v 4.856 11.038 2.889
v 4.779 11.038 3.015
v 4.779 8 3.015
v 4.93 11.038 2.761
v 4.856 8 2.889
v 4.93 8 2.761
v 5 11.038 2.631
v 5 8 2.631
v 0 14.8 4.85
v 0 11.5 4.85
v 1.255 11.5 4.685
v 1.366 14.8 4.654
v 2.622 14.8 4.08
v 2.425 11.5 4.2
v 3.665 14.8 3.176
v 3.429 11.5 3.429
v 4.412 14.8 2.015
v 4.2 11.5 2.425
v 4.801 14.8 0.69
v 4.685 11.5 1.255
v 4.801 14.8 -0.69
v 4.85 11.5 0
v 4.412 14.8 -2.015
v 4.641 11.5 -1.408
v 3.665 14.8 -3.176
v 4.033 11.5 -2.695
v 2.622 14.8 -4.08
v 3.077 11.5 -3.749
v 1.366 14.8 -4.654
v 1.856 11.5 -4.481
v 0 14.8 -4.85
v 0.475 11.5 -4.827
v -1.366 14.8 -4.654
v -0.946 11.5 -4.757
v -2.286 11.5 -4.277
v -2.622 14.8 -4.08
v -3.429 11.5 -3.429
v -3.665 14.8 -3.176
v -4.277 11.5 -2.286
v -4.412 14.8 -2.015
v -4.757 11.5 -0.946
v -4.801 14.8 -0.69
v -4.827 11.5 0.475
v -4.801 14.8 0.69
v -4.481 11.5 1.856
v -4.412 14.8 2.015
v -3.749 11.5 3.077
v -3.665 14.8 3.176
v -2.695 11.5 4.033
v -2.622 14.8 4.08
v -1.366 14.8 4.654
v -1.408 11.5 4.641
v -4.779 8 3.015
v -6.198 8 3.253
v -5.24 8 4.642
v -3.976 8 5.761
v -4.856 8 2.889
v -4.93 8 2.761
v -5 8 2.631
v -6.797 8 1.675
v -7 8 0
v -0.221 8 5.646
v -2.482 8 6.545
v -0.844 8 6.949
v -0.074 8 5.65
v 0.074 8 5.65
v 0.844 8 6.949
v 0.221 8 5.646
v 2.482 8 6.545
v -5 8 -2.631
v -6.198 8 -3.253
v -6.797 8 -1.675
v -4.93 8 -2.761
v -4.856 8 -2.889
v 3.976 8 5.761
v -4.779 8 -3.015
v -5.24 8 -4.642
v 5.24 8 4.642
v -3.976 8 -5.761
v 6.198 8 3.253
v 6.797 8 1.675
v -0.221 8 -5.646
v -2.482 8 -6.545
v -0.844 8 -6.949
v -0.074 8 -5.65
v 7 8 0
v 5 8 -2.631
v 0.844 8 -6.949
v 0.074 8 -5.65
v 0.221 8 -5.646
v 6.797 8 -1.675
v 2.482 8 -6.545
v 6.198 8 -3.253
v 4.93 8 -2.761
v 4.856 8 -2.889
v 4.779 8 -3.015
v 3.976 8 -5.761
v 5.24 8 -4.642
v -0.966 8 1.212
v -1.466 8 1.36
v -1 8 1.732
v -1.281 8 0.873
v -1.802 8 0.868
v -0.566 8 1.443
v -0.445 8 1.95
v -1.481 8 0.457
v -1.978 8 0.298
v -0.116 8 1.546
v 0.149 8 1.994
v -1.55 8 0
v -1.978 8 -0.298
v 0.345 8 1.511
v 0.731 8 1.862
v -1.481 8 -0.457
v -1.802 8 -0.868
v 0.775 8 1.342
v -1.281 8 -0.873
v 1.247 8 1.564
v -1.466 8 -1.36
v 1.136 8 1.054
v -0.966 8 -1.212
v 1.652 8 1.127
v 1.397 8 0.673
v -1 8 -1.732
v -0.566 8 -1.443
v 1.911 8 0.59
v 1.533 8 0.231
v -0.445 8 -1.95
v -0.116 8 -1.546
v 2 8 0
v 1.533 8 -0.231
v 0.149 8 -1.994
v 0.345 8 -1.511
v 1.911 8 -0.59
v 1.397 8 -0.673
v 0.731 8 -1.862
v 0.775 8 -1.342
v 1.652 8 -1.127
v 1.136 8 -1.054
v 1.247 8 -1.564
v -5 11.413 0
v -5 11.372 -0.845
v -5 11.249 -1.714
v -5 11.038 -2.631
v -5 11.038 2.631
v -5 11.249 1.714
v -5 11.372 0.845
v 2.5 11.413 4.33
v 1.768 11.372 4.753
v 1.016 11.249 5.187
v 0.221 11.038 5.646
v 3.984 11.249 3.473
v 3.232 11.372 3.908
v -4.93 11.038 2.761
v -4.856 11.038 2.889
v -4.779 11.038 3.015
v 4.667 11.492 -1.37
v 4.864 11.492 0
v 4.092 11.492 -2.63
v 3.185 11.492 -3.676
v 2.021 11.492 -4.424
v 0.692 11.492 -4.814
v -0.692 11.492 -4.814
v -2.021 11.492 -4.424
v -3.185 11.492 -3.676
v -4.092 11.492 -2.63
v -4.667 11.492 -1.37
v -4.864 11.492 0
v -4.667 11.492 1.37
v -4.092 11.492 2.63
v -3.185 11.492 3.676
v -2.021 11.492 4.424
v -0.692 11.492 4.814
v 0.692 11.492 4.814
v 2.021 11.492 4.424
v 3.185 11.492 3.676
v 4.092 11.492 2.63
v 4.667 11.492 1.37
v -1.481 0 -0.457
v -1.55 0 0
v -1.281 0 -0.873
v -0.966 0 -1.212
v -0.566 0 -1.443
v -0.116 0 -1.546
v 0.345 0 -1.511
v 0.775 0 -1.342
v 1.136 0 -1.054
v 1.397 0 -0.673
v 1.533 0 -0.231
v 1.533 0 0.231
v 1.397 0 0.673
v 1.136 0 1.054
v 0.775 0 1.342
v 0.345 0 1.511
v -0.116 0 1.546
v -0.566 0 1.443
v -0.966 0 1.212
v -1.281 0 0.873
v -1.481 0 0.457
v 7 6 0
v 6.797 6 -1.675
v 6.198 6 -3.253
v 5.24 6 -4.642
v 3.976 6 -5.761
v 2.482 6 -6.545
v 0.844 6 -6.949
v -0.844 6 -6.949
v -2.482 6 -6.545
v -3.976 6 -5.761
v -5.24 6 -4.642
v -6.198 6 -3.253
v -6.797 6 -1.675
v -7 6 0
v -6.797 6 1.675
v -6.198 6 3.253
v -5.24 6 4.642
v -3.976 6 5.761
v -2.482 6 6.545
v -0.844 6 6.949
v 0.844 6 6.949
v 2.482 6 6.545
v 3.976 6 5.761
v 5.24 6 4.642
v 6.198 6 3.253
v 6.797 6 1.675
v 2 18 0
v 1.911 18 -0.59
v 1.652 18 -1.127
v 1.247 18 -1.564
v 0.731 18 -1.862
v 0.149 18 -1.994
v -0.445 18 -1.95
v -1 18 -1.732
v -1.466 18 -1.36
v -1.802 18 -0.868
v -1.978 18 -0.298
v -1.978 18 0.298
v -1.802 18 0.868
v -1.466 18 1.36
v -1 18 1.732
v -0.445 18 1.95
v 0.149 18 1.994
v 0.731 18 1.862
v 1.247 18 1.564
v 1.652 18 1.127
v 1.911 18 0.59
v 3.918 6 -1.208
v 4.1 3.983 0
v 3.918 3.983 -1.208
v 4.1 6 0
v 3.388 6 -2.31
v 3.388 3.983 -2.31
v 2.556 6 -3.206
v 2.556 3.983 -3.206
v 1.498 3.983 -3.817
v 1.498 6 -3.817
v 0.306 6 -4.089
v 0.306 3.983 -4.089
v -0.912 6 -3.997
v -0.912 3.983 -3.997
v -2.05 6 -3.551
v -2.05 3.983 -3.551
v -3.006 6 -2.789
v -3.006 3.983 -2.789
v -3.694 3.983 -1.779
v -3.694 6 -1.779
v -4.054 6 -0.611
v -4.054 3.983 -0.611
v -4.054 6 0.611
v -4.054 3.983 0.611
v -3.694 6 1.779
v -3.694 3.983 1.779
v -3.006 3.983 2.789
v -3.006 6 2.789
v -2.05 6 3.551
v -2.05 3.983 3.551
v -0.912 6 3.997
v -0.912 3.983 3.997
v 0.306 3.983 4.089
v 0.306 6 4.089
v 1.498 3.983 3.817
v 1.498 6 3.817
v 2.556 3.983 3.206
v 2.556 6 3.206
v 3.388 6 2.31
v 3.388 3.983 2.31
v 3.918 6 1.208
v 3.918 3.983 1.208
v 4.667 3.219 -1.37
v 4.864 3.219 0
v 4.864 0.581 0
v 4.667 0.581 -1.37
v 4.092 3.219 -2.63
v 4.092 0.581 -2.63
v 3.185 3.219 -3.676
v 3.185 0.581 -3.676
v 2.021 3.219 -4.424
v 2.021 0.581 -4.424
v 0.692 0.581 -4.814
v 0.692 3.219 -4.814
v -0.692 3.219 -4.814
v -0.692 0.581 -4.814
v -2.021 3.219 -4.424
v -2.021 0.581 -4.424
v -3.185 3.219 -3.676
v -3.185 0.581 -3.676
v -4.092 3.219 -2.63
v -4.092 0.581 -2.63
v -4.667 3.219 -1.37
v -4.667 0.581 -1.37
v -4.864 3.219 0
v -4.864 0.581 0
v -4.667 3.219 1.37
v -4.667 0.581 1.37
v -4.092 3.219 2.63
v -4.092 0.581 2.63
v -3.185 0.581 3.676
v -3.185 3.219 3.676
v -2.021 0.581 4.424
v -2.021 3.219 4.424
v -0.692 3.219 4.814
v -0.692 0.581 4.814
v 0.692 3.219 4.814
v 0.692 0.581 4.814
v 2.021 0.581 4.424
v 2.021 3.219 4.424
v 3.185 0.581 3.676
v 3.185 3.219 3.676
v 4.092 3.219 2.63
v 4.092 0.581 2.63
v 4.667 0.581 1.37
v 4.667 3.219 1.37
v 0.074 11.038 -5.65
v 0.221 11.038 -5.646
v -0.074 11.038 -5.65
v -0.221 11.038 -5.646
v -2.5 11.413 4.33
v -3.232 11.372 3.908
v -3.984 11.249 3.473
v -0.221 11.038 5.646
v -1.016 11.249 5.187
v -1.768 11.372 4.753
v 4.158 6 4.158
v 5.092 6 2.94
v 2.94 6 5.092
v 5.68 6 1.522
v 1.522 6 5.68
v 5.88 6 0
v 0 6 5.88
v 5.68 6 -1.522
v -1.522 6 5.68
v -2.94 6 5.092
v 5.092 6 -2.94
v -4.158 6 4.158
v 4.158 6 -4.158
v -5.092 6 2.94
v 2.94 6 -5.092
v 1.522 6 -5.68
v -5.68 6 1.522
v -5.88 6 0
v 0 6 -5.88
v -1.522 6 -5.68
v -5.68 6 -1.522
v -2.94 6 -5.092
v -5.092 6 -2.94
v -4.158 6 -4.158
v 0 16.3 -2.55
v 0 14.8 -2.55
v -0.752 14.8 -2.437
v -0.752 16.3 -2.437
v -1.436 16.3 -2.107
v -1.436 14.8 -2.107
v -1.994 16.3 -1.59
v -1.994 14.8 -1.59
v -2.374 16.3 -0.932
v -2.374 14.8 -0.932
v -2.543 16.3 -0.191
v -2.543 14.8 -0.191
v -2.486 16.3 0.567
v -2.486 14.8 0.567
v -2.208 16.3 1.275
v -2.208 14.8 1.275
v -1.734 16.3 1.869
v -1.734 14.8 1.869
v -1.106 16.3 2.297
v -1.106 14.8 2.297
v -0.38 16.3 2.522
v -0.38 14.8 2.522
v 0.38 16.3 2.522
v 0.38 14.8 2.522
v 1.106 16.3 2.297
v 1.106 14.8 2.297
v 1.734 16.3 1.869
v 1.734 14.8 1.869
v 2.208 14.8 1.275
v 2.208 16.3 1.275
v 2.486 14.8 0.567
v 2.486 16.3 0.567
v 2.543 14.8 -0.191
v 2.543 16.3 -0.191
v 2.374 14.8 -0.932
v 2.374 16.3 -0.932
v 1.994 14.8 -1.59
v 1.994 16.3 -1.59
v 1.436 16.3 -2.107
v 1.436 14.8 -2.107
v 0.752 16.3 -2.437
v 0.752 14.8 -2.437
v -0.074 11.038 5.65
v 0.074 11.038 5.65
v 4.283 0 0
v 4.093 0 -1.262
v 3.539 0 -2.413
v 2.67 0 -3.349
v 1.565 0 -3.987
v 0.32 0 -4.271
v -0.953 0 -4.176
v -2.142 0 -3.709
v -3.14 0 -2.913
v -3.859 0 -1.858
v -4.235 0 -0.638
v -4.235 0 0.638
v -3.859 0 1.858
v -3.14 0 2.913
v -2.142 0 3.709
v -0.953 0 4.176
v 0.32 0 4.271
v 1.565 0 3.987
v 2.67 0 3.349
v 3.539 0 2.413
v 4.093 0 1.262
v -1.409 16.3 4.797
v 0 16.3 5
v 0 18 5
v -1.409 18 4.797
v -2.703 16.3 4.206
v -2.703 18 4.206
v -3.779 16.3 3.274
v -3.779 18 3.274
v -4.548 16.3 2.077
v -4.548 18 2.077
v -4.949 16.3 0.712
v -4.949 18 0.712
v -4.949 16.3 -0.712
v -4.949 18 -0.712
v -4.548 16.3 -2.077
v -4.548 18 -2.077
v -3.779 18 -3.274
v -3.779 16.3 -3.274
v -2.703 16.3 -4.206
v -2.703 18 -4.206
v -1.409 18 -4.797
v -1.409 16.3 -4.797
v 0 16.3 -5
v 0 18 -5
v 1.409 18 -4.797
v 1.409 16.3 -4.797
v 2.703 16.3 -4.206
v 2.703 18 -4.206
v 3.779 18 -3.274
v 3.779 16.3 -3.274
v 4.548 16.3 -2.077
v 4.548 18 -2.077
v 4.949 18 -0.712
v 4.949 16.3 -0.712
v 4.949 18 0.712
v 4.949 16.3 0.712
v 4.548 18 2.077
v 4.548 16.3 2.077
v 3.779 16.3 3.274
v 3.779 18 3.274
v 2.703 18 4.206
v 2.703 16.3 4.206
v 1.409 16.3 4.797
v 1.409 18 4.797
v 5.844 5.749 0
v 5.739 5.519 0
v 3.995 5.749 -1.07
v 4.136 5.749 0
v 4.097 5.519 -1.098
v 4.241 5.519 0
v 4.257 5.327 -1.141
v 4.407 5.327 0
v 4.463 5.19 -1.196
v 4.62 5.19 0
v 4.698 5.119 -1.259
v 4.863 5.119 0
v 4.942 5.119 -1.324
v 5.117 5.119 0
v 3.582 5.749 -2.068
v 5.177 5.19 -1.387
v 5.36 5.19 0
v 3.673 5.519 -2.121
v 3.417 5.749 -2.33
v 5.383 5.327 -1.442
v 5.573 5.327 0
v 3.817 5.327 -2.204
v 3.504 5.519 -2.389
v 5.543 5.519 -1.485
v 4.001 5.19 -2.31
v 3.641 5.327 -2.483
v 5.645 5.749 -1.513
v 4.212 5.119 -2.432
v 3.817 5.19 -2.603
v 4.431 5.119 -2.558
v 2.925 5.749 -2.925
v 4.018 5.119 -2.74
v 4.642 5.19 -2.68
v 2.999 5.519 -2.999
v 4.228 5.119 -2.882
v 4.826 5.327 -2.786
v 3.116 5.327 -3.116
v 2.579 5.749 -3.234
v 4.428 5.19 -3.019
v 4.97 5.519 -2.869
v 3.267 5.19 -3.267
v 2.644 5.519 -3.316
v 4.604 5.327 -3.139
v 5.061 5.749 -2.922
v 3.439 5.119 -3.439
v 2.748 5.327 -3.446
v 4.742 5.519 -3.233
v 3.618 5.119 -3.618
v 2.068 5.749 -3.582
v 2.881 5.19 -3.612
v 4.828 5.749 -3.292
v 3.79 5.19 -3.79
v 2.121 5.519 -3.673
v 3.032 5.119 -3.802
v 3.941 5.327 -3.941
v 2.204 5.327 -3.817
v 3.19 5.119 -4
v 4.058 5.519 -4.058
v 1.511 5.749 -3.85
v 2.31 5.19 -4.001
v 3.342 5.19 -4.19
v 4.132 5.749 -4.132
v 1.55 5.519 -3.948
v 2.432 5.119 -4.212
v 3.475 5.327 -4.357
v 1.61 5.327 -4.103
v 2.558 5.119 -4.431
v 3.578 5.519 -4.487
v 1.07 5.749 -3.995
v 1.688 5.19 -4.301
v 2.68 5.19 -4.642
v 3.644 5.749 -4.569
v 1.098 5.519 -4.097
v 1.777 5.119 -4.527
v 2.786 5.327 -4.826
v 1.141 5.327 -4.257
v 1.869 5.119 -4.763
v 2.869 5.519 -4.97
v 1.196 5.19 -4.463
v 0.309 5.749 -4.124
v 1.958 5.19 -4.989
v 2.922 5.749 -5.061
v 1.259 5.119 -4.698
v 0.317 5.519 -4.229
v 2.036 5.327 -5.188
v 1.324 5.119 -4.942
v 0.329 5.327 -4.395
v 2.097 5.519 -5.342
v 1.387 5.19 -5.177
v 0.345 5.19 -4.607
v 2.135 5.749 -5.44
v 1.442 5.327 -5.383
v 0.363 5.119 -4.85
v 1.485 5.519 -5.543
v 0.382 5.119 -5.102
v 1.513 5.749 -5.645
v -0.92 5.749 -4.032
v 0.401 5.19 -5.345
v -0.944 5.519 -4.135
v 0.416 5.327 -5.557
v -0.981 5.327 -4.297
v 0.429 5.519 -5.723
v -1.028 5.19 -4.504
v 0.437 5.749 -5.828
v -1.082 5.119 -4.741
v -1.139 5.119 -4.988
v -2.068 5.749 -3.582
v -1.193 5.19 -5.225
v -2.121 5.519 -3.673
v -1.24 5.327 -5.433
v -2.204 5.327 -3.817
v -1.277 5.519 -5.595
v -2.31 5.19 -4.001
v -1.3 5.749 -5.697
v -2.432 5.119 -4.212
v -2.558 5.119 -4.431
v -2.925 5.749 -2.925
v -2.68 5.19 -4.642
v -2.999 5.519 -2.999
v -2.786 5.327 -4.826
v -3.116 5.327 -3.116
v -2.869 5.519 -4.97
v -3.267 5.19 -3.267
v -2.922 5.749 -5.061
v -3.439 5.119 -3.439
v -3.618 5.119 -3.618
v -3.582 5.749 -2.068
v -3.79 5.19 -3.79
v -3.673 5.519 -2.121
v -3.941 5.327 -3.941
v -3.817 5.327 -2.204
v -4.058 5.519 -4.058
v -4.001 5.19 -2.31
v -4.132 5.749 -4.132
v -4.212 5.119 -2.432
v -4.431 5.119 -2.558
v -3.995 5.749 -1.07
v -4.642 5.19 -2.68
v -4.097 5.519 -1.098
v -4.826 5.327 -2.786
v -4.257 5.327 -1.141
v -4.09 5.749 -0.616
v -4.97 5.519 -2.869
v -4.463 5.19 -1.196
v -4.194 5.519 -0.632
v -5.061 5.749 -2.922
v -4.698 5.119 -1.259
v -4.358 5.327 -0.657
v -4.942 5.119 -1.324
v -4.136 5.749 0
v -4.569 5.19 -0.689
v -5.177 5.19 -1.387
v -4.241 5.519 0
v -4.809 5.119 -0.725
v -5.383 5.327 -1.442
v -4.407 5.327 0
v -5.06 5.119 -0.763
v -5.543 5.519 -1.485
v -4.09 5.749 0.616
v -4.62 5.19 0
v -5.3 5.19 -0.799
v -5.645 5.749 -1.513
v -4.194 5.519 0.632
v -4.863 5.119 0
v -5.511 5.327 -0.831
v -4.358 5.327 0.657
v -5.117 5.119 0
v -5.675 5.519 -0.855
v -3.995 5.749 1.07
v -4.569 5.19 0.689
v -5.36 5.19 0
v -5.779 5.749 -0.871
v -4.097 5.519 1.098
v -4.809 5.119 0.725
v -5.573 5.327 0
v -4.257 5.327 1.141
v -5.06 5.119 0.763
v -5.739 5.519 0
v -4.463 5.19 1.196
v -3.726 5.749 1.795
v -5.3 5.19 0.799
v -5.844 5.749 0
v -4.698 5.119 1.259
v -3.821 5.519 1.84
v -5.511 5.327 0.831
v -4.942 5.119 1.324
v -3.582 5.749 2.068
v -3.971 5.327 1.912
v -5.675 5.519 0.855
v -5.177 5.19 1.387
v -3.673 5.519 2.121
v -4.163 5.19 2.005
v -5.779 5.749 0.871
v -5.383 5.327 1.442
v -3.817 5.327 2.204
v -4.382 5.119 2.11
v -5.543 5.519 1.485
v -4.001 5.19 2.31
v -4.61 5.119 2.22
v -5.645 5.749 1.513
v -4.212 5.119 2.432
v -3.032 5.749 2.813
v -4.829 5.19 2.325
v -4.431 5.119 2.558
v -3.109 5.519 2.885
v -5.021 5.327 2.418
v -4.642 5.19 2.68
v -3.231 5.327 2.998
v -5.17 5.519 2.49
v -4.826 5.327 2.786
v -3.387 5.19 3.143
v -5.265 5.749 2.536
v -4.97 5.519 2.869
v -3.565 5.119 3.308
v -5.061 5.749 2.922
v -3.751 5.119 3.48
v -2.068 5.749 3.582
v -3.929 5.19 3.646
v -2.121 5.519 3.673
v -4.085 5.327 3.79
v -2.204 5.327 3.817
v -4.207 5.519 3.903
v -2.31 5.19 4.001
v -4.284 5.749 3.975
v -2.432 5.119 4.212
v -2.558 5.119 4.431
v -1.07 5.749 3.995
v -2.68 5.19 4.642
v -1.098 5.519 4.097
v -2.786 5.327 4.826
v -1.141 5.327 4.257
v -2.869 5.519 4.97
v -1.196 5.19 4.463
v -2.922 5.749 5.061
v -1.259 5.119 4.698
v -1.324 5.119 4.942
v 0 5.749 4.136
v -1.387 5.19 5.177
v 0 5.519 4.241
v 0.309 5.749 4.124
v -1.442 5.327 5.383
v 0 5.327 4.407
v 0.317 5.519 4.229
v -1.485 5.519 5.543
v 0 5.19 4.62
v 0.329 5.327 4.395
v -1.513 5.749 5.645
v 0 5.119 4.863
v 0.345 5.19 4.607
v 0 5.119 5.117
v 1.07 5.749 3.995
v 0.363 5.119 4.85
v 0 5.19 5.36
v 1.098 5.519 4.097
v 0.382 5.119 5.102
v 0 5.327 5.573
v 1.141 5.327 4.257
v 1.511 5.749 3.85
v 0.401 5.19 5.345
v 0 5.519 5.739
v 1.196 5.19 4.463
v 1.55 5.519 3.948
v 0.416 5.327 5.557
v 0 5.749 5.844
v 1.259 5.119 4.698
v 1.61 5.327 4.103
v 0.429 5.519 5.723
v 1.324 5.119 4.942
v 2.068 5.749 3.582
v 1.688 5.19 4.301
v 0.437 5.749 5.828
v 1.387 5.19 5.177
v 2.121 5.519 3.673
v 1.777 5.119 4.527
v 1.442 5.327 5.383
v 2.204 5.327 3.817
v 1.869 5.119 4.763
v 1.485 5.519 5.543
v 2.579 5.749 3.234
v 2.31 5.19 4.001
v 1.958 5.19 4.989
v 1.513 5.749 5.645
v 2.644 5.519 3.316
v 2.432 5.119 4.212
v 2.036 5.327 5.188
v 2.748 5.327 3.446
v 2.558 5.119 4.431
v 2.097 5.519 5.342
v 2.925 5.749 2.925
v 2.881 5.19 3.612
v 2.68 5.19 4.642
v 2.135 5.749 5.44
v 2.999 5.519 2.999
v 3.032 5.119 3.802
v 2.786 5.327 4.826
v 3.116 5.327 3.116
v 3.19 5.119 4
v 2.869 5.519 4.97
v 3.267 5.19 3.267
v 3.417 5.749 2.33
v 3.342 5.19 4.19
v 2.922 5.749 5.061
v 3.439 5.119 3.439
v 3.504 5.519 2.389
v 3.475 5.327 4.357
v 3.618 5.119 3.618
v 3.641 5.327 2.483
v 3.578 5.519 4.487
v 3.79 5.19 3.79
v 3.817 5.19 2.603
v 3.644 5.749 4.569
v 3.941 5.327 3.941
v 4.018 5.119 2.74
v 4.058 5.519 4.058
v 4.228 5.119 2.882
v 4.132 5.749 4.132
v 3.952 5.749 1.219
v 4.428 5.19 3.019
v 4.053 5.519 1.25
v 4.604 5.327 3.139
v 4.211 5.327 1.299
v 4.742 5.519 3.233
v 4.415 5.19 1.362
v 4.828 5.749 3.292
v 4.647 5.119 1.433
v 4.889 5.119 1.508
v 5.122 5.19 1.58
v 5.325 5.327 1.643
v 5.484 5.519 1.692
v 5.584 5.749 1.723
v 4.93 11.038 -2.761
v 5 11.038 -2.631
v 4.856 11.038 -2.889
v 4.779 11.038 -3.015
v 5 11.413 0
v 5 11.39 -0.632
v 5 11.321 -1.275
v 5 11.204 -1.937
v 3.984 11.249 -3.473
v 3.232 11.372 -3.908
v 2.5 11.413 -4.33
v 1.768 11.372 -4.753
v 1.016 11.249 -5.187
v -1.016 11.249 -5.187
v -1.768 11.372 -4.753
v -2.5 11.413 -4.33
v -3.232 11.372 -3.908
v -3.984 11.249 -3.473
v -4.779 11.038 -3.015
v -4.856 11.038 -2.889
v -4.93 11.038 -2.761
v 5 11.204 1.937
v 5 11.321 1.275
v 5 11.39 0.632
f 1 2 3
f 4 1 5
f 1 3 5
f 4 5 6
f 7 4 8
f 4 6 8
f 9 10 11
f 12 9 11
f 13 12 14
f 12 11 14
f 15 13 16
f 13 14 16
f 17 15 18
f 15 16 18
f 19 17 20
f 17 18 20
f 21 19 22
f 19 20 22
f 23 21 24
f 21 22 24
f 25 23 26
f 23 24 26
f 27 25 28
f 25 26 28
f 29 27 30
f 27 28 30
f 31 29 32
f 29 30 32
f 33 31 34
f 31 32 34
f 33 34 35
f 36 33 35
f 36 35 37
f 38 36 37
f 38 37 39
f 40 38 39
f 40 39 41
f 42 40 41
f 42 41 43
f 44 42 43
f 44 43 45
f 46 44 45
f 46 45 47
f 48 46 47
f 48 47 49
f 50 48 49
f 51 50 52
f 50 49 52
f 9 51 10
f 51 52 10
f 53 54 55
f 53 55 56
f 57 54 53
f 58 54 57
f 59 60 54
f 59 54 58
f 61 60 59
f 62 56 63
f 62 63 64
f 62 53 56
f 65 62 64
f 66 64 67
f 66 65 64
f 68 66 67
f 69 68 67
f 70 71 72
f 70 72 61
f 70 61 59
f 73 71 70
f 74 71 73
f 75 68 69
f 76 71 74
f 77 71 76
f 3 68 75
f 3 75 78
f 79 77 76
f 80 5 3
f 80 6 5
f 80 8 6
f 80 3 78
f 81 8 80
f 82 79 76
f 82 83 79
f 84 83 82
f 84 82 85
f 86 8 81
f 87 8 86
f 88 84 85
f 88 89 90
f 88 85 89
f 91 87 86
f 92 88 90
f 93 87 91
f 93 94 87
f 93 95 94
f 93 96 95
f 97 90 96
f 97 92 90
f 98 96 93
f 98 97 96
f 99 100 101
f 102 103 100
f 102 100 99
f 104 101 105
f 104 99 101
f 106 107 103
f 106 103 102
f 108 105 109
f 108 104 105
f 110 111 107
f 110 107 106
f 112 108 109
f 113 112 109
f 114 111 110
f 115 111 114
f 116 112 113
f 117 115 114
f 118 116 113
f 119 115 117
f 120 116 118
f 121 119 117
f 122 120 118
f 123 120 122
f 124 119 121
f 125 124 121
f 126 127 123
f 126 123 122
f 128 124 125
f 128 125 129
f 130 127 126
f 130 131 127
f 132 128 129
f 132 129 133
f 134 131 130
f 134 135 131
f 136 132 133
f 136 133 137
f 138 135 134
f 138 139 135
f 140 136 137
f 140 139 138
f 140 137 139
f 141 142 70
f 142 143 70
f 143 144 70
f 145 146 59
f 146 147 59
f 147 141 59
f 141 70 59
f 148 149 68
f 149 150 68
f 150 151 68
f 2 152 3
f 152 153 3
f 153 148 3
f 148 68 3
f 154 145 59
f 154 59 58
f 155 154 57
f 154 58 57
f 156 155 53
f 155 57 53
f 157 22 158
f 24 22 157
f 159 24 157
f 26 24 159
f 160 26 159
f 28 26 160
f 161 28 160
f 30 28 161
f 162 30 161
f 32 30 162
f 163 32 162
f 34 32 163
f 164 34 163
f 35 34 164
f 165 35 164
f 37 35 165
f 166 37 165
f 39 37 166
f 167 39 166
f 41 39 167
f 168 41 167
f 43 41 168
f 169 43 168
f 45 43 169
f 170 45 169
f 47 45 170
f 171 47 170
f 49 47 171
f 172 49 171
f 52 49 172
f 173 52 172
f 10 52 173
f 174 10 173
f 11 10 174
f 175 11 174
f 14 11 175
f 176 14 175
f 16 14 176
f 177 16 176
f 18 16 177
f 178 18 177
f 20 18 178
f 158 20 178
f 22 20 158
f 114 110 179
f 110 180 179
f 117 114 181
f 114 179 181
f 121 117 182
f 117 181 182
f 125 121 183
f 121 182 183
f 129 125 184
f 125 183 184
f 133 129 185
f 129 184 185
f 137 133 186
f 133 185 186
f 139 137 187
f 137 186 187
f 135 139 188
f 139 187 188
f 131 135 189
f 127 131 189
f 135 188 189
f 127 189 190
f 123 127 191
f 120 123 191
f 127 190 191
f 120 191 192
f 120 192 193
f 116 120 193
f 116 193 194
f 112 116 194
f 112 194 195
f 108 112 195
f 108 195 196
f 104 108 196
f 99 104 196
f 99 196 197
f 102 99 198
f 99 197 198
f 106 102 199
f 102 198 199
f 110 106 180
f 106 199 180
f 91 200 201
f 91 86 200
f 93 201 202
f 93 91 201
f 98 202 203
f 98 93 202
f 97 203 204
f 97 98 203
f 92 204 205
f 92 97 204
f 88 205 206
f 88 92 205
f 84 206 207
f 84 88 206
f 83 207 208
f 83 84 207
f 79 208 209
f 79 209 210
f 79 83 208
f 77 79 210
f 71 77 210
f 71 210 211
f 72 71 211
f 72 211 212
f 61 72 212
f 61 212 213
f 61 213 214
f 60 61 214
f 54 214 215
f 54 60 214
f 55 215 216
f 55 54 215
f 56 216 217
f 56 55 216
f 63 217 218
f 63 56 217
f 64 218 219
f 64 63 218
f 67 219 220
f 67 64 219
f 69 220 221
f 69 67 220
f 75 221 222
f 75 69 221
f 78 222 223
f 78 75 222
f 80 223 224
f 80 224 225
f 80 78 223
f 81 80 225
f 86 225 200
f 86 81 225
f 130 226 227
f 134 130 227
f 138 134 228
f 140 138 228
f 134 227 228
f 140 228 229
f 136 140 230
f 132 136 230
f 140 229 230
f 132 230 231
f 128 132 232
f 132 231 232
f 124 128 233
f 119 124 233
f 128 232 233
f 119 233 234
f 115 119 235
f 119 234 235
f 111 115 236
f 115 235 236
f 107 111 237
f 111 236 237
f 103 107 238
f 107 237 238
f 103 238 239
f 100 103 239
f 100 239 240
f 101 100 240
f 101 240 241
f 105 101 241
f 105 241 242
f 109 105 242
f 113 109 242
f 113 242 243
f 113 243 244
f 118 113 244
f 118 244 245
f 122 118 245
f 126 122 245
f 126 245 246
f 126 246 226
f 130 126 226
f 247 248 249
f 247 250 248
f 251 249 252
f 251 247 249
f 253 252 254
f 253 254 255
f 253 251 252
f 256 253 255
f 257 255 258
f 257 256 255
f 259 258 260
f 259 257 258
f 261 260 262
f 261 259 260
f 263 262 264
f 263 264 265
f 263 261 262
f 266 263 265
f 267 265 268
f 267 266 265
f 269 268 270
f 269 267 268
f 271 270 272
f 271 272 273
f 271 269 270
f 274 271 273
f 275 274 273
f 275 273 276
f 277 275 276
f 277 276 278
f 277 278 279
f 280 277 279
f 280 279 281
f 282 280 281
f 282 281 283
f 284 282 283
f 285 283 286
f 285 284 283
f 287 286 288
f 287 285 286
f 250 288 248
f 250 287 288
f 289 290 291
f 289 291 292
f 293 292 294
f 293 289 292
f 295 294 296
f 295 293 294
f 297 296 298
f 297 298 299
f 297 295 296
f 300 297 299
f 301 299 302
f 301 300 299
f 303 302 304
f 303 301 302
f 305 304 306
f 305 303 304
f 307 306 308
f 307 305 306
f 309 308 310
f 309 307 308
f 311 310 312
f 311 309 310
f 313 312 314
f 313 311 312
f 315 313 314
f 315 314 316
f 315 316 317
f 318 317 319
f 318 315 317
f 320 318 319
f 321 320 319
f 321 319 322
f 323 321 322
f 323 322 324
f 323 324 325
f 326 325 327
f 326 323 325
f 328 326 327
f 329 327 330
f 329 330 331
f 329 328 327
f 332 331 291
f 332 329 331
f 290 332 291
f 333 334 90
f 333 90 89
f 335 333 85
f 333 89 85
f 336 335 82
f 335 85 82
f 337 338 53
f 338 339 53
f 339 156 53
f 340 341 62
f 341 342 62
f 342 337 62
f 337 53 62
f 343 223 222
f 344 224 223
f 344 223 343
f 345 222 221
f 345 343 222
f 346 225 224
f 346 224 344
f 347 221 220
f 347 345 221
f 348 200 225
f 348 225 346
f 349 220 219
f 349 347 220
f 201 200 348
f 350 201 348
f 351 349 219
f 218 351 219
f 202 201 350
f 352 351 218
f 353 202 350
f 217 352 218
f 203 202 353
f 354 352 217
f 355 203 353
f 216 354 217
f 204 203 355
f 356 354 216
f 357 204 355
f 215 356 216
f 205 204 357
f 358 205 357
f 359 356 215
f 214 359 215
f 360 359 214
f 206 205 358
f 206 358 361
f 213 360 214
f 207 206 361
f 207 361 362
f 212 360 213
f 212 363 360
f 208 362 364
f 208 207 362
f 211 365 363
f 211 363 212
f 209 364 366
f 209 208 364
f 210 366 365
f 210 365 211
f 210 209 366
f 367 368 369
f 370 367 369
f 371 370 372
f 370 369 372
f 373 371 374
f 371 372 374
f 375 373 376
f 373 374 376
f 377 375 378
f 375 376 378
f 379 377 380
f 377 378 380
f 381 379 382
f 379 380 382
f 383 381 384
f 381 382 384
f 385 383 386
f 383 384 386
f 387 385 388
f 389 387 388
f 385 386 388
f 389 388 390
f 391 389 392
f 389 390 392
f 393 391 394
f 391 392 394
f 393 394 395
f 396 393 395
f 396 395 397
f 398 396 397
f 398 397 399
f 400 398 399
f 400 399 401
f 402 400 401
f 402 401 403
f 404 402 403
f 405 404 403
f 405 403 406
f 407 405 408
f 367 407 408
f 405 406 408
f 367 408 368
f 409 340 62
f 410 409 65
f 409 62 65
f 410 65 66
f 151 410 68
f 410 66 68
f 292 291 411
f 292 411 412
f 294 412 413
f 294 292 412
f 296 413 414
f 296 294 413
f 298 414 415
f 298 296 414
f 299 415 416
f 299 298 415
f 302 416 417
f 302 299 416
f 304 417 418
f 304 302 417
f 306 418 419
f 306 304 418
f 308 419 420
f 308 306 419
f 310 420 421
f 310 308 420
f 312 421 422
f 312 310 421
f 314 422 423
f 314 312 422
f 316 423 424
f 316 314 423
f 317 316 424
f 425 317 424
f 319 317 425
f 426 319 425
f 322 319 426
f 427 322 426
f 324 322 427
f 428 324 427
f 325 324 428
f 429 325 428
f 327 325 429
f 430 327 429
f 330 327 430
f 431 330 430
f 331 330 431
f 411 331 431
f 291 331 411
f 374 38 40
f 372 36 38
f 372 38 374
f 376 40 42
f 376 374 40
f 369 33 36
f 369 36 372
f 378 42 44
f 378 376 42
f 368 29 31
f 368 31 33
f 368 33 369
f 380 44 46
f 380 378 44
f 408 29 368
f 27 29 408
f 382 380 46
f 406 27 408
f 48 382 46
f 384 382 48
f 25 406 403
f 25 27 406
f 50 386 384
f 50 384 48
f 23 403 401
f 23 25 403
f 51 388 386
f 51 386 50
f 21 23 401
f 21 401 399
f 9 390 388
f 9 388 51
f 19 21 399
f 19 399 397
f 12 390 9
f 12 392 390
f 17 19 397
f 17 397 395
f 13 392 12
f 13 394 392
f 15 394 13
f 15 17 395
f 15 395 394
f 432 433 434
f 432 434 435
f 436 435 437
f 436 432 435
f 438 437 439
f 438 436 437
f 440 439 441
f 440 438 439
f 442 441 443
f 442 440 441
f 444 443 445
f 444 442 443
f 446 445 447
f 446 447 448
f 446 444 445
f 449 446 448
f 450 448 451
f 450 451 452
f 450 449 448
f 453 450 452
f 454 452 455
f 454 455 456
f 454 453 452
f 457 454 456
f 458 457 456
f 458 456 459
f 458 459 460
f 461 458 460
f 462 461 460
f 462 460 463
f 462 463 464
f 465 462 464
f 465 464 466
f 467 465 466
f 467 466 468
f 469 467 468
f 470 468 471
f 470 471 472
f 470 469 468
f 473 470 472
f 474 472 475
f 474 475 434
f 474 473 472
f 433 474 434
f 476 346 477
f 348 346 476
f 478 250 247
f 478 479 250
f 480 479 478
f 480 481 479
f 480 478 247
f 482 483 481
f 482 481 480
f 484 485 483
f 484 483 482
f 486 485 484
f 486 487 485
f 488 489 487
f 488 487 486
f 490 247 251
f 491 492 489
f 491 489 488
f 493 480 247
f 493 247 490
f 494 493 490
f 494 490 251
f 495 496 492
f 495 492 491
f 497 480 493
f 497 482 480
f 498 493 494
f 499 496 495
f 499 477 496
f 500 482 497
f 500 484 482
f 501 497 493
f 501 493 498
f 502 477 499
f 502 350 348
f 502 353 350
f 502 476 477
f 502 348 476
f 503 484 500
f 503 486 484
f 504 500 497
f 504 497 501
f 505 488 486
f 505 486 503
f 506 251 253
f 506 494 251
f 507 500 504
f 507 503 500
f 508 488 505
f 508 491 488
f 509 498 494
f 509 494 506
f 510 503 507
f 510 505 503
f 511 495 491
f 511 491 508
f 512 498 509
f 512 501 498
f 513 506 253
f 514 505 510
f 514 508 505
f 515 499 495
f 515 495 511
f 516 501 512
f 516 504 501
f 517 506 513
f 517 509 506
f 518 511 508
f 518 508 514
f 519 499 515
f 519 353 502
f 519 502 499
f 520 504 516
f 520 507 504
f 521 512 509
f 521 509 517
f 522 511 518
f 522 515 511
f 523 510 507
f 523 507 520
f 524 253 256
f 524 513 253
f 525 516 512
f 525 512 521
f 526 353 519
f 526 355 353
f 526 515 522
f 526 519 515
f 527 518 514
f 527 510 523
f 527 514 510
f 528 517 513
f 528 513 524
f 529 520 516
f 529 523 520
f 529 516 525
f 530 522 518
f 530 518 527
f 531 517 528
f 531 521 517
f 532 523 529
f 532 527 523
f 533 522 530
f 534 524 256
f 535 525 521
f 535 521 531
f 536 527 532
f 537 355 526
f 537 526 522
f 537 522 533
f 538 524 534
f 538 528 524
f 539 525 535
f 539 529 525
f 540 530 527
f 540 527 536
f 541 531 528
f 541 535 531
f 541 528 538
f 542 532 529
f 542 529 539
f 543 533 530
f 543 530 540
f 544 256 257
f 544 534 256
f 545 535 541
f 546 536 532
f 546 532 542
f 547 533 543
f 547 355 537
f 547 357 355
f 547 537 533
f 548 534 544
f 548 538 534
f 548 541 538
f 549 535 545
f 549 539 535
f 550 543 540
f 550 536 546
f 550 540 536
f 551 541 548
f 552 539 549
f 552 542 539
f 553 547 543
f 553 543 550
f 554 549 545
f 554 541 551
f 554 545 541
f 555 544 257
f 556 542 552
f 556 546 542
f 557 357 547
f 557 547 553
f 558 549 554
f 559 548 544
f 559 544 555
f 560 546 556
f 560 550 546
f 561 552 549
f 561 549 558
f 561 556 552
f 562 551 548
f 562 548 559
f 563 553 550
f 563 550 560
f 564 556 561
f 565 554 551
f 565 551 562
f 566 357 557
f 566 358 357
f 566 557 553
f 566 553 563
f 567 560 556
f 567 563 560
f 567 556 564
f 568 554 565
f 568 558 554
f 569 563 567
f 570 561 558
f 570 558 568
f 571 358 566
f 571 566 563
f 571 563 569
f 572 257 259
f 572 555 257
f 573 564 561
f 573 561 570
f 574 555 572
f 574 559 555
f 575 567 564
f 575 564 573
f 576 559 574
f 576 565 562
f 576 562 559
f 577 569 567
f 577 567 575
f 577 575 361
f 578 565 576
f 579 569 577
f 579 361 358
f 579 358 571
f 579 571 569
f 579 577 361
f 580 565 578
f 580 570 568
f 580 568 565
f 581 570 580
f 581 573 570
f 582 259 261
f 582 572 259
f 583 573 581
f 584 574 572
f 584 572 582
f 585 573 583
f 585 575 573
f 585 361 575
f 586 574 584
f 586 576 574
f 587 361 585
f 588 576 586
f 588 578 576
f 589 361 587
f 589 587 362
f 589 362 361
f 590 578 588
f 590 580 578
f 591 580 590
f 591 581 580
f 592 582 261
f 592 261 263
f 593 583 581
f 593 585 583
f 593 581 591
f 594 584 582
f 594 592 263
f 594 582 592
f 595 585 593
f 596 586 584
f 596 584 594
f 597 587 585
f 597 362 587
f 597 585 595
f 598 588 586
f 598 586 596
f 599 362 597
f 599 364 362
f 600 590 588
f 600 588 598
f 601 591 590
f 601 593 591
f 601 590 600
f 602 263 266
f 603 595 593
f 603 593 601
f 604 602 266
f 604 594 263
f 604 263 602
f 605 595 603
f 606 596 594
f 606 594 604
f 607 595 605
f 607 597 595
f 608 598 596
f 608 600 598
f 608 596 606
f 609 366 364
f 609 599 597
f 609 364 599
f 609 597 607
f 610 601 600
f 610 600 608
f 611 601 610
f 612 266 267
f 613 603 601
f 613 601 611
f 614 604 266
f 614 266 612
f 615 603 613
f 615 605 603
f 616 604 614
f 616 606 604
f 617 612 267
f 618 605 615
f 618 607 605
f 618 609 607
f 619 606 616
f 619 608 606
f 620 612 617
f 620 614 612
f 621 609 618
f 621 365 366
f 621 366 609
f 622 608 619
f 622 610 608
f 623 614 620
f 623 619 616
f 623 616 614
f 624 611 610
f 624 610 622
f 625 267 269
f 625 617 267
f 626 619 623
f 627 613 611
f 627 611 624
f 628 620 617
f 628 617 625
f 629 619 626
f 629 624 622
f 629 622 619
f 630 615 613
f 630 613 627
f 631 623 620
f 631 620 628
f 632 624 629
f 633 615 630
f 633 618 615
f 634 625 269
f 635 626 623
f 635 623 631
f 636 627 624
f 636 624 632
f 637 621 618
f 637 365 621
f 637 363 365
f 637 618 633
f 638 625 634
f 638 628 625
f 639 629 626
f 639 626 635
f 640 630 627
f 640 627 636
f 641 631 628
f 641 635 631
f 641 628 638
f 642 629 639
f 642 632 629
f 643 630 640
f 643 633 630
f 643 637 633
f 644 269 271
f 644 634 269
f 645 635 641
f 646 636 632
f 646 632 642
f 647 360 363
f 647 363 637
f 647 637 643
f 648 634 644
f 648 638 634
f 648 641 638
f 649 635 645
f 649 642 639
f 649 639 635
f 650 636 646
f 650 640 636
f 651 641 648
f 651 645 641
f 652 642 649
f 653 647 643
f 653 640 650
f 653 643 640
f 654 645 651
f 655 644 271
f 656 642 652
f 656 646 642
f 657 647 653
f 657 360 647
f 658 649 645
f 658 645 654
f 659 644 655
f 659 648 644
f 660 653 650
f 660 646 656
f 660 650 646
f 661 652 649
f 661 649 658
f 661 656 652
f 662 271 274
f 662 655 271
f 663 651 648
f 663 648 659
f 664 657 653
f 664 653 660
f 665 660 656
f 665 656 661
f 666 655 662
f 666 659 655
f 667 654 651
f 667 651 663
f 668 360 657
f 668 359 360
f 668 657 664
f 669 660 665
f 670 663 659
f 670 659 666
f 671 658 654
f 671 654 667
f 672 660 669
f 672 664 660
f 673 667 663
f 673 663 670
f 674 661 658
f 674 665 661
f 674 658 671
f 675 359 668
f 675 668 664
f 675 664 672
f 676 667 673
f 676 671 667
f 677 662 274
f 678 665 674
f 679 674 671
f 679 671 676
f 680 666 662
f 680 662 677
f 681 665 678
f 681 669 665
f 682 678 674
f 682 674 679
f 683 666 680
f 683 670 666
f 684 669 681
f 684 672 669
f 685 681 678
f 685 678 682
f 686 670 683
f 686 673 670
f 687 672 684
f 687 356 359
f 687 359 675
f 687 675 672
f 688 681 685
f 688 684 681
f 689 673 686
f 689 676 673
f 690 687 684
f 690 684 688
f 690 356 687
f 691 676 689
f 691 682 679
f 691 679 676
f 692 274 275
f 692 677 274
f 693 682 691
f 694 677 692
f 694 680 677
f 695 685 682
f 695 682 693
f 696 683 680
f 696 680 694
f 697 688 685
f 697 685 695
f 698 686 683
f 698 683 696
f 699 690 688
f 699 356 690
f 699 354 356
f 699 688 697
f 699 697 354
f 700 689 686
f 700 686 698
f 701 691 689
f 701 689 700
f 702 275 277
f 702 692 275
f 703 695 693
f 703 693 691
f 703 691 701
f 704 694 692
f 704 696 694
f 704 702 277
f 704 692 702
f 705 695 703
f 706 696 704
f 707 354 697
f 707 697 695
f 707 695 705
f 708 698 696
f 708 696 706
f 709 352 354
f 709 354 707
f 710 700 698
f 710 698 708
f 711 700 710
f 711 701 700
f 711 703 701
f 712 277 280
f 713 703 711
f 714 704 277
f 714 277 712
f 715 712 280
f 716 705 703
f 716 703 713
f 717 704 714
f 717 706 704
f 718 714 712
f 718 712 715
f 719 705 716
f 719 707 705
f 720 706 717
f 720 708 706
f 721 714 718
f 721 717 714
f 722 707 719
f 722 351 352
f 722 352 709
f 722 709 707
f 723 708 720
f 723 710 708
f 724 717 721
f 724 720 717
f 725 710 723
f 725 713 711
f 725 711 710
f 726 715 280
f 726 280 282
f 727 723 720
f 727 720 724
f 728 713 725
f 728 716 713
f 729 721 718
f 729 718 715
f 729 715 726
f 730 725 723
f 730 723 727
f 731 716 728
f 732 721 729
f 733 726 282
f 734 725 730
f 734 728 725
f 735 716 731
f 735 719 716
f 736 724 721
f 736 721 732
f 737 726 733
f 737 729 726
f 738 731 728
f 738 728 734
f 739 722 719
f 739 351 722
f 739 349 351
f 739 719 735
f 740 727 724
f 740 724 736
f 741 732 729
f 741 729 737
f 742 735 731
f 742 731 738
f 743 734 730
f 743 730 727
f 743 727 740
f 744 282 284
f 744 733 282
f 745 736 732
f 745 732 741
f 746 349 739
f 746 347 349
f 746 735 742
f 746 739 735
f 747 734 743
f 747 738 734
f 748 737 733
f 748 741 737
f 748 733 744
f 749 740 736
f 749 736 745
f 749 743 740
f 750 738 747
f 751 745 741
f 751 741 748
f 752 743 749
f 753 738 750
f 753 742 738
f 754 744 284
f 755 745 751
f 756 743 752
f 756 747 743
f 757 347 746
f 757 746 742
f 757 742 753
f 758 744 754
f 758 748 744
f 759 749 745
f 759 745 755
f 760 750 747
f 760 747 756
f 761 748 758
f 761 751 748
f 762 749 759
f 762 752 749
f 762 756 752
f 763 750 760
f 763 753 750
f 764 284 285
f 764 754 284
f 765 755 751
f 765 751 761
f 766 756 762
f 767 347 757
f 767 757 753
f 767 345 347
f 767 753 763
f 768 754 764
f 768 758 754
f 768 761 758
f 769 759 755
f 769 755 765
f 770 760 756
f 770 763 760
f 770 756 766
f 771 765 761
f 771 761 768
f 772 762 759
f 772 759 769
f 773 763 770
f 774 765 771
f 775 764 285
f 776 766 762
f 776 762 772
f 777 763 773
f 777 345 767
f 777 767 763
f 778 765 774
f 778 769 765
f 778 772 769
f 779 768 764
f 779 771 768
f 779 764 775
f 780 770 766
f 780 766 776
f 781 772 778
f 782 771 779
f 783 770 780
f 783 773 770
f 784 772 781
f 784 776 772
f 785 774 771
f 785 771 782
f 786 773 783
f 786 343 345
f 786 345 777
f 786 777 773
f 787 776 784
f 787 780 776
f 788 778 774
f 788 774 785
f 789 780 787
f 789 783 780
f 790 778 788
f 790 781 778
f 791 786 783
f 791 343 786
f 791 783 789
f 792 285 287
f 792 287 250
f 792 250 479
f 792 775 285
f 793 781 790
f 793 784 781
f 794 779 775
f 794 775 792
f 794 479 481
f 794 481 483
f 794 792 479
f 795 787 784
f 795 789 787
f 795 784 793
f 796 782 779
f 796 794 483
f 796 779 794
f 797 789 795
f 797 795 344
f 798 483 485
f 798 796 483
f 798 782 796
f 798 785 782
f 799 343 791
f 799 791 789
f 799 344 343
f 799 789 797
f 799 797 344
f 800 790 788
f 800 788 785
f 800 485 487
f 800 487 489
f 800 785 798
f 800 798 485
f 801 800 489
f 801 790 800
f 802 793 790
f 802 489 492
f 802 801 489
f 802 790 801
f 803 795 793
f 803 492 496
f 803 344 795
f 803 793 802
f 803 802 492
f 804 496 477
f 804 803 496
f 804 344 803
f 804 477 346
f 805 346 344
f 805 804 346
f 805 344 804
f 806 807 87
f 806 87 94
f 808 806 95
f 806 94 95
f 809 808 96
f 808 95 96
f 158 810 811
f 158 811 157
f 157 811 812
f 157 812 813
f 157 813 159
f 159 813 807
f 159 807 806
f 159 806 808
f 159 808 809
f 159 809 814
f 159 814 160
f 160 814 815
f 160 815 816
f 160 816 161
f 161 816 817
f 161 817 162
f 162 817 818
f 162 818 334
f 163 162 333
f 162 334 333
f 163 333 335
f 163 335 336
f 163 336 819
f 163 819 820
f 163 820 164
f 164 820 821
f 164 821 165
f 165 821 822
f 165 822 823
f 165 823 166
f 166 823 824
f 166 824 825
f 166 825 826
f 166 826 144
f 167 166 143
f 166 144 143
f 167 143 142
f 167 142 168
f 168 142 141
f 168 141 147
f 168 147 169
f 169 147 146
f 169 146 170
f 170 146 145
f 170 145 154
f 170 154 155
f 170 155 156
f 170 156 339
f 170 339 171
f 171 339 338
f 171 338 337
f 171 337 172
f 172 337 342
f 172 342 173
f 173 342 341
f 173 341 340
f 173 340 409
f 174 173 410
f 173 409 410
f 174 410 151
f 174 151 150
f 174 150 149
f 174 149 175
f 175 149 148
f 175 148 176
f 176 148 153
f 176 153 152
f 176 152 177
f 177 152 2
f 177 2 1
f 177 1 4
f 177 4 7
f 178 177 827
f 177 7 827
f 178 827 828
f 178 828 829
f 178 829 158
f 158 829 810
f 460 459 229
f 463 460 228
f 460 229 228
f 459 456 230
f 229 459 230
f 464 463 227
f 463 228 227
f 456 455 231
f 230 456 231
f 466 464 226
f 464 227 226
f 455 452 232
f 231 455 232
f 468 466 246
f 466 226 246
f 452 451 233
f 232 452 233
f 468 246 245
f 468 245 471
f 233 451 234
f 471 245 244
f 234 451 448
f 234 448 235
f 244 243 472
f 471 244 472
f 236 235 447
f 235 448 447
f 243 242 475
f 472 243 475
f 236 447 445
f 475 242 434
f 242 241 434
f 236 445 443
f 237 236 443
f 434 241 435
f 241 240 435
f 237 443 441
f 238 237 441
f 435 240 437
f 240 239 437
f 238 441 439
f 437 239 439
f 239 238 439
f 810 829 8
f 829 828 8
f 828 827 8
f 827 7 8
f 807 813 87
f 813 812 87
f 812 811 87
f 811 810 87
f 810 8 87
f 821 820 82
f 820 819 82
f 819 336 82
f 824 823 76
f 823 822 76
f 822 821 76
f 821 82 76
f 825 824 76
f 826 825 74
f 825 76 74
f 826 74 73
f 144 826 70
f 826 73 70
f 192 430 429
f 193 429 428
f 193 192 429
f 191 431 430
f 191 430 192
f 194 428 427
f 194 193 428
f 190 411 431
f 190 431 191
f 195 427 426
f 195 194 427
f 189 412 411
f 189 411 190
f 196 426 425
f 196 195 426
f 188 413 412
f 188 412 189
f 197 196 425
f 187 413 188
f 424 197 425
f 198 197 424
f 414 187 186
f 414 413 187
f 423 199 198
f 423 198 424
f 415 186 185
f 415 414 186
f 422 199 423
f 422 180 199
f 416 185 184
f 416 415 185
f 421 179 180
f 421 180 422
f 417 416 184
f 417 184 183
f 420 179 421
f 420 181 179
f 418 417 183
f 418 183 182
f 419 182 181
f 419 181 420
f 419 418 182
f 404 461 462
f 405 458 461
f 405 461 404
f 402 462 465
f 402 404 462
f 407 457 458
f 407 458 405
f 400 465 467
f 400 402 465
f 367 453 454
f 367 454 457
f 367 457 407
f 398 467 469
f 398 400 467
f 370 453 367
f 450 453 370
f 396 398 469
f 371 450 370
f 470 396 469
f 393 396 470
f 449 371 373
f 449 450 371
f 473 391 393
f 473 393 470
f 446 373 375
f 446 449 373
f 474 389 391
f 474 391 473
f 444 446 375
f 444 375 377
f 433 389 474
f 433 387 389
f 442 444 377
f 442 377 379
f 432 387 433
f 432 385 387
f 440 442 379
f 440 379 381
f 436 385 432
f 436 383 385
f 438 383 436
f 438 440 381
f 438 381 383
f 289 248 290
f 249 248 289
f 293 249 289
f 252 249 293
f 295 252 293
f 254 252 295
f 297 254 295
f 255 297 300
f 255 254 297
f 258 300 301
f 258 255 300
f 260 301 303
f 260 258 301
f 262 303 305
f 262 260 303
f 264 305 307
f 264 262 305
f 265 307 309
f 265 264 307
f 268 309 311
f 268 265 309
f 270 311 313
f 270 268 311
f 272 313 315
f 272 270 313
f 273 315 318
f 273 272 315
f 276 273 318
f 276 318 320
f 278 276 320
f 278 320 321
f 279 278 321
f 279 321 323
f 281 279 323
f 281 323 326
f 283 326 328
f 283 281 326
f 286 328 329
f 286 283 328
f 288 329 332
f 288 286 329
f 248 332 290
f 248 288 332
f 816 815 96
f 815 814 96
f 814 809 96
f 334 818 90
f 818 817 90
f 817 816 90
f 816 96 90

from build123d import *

# Parameters (mm, degrees)
ESTRUSIONE_ESTRUSIONE1_START                         = 8
ESTRUSIONE_ESTRUSIONE1_2_OUTLINE_R                   = 4.864
ESTRUSIONE_ESTRUSIONE1_2_DEPTH                       = 3.491917096
SCHIZZO2_R                                           = 4.85
ESTRUSIONE_ESTRUSIONE2_DEPTH                         = 3.3
SCHIZZO3_R                                           = 2.55
ESTRUSIONE_ESTRUSIONE3_DEPTH                         = 1.5
SCHIZZO4_R                                           = 5
ESTRUSIONE_ESTRUSIONE4_DEPTH                         = 1.7
FORO_LAMATO_PER_VITE_M2_5_A_TESTA_ESAGON_D           = 3.1
FORO_LAMATO_PER_VITE_M2_5_A_TESTA_ESAGON_CBORE_D     = 4
FORO_LAMATO_PER_VITE_M2_5_A_TESTA_ESAGON_CBORE_DEPTH = 10
SMUSSO1_SIZE                                         = 0.581


with BuildPart() as part:
    # Estrusione-Estrusione1: read off the stored shape, not the designer's step
    # Estrusione-Estrusione1 outline → Estrusione-Estrusione1 (revolve)
    with BuildSketch(Plane.XY):
        with BuildLine():
            Line((0, 0), (4.864, 0))
            Line((4.864, 0), (4.864, 3.219))
            Line((4.864, 3.219), (4.1, 3.983))
            Line((4.1, 3.983), (4.1, 6))
            ThreePointArc((4.1, 6), (4.99, 5.11), (5.88, 6))
            Line((5.88, 6), (7, 6))
            Line((7, 6), (7, 8))
            Line((7, 8), (4.864, 8))
            Line((4.864, 8), (4.864, 11.491917096))
            Line((4.864, 11.491917096), (4.85, 11.5))
            Line((4.85, 11.5), (0, 11.5))
            Line((0, 11.5), (0, 0))
        make_face()
    revolve(axis=Axis((0, 0, 0), (0, 1, 0)))

    # Estrusione-Estrusione1 2 outline → Estrusione-Estrusione1 2 (add)
    with BuildSketch(Plane(origin=(0, 0, 0), x_dir=(1, 0, 0), z_dir=(0, 1, 0)).offset(ESTRUSIONE_ESTRUSIONE1_START)):
        with BuildLine():
            ThreePointArc((4.77856863, -3.014594807), (4.893043531, -2.825), (5, -2.631064423))
            Line((5, -2.631064423), (5, 2.631064423))
            ThreePointArc((5, 2.631064423), (4.893043531, 2.825), (4.77856863, 3.014594807))
            Line((4.77856863, 3.014594807), (0.22143137, 5.645659231))
            ThreePointArc((0.22143137, 5.645659231), (0, 5.65), (-0.22143137, 5.645659231))
            Line((-0.22143137, 5.645659231), (-4.77856863, 3.014594807))
            ThreePointArc((-4.77856863, 3.014594807), (-4.893043531, 2.825), (-5, 2.631064423))
            Line((-5, 2.631064423), (-5, -2.631064423))
            ThreePointArc((-5, -2.631064423), (-4.893043531, -2.825), (-4.77856863, -3.014594807))
            Line((-4.77856863, -3.014594807), (-0.22143137, -5.645659231))
            ThreePointArc((-0.22143137, -5.645659231), (0, -5.65), (0.22143137, -5.645659231))
            Line((0.22143137, -5.645659231), (4.77856863, -3.014594807))
        make_face()
        Circle(ESTRUSIONE_ESTRUSIONE1_2_OUTLINE_R, mode=Mode.SUBTRACT)
    extrude(amount=ESTRUSIONE_ESTRUSIONE1_2_DEPTH)

    # Estrusione-Estrusione1 3 outline → Estrusione-Estrusione1 3 (revolve, cut)
    with BuildSketch(Plane.XY):
        Polygon((5.65, 11.491917096), (4.864, 11.491917096), (5.65, 11.038119785), align=None)
    revolve(axis=Axis((0, 0, 0), (0, 1, 0)), mode=Mode.SUBTRACT)

    # Schizzo2 → Estrusione-Estrusione2 (add)
    with BuildSketch(Plane(origin=(0, 11.5, 0), x_dir=(-1, 0, 0), z_dir=(0, 1, 0))):
        with Locations(Location((0, 0, 0), (0, 0, 90))):
            Circle(SCHIZZO2_R)
    extrude(amount=ESTRUSIONE_ESTRUSIONE2_DEPTH)

    # Schizzo3 → Estrusione-Estrusione3 (add)
    with BuildSketch(Plane(origin=(0, 14.8, 0), x_dir=(-1, 0, 0), z_dir=(0, 1, 0))):
        with Locations(Location((0, 0, 0), (0, 0, 270))):
            Circle(SCHIZZO3_R)
    extrude(amount=ESTRUSIONE_ESTRUSIONE3_DEPTH)

    # Schizzo4 → Estrusione-Estrusione4 (add)
    with BuildSketch(Plane.XZ.offset(-16.3)):
        with Locations(Location((0, 0, 0), (0, 0, 90))):
            Circle(SCHIZZO4_R)
    extrude(amount=-ESTRUSIONE_ESTRUSIONE4_DEPTH)

    # Foro lamato per Vite M2.5 a testa esagonale-1 (through all)
    with Locations(Plane(origin=(0, 18, 0), x_dir=(1, 0, 0), z_dir=(0, 1, 0))):
        with Locations((0, 0)):
            CounterBoreHole(FORO_LAMATO_PER_VITE_M2_5_A_TESTA_ESAGON_D / 2, FORO_LAMATO_PER_VITE_M2_5_A_TESTA_ESAGON_CBORE_D / 2, FORO_LAMATO_PER_VITE_M2_5_A_TESTA_ESAGON_CBORE_DEPTH)

    # Smusso1
    smusso1_edges = [part.edges().sort_by_distance(p)[0] for p in [
        (-4.864, 0, 0),
    ]]
    chamfer(smusso1_edges, length=SMUSSO1_SIZE)


solid = part.part
